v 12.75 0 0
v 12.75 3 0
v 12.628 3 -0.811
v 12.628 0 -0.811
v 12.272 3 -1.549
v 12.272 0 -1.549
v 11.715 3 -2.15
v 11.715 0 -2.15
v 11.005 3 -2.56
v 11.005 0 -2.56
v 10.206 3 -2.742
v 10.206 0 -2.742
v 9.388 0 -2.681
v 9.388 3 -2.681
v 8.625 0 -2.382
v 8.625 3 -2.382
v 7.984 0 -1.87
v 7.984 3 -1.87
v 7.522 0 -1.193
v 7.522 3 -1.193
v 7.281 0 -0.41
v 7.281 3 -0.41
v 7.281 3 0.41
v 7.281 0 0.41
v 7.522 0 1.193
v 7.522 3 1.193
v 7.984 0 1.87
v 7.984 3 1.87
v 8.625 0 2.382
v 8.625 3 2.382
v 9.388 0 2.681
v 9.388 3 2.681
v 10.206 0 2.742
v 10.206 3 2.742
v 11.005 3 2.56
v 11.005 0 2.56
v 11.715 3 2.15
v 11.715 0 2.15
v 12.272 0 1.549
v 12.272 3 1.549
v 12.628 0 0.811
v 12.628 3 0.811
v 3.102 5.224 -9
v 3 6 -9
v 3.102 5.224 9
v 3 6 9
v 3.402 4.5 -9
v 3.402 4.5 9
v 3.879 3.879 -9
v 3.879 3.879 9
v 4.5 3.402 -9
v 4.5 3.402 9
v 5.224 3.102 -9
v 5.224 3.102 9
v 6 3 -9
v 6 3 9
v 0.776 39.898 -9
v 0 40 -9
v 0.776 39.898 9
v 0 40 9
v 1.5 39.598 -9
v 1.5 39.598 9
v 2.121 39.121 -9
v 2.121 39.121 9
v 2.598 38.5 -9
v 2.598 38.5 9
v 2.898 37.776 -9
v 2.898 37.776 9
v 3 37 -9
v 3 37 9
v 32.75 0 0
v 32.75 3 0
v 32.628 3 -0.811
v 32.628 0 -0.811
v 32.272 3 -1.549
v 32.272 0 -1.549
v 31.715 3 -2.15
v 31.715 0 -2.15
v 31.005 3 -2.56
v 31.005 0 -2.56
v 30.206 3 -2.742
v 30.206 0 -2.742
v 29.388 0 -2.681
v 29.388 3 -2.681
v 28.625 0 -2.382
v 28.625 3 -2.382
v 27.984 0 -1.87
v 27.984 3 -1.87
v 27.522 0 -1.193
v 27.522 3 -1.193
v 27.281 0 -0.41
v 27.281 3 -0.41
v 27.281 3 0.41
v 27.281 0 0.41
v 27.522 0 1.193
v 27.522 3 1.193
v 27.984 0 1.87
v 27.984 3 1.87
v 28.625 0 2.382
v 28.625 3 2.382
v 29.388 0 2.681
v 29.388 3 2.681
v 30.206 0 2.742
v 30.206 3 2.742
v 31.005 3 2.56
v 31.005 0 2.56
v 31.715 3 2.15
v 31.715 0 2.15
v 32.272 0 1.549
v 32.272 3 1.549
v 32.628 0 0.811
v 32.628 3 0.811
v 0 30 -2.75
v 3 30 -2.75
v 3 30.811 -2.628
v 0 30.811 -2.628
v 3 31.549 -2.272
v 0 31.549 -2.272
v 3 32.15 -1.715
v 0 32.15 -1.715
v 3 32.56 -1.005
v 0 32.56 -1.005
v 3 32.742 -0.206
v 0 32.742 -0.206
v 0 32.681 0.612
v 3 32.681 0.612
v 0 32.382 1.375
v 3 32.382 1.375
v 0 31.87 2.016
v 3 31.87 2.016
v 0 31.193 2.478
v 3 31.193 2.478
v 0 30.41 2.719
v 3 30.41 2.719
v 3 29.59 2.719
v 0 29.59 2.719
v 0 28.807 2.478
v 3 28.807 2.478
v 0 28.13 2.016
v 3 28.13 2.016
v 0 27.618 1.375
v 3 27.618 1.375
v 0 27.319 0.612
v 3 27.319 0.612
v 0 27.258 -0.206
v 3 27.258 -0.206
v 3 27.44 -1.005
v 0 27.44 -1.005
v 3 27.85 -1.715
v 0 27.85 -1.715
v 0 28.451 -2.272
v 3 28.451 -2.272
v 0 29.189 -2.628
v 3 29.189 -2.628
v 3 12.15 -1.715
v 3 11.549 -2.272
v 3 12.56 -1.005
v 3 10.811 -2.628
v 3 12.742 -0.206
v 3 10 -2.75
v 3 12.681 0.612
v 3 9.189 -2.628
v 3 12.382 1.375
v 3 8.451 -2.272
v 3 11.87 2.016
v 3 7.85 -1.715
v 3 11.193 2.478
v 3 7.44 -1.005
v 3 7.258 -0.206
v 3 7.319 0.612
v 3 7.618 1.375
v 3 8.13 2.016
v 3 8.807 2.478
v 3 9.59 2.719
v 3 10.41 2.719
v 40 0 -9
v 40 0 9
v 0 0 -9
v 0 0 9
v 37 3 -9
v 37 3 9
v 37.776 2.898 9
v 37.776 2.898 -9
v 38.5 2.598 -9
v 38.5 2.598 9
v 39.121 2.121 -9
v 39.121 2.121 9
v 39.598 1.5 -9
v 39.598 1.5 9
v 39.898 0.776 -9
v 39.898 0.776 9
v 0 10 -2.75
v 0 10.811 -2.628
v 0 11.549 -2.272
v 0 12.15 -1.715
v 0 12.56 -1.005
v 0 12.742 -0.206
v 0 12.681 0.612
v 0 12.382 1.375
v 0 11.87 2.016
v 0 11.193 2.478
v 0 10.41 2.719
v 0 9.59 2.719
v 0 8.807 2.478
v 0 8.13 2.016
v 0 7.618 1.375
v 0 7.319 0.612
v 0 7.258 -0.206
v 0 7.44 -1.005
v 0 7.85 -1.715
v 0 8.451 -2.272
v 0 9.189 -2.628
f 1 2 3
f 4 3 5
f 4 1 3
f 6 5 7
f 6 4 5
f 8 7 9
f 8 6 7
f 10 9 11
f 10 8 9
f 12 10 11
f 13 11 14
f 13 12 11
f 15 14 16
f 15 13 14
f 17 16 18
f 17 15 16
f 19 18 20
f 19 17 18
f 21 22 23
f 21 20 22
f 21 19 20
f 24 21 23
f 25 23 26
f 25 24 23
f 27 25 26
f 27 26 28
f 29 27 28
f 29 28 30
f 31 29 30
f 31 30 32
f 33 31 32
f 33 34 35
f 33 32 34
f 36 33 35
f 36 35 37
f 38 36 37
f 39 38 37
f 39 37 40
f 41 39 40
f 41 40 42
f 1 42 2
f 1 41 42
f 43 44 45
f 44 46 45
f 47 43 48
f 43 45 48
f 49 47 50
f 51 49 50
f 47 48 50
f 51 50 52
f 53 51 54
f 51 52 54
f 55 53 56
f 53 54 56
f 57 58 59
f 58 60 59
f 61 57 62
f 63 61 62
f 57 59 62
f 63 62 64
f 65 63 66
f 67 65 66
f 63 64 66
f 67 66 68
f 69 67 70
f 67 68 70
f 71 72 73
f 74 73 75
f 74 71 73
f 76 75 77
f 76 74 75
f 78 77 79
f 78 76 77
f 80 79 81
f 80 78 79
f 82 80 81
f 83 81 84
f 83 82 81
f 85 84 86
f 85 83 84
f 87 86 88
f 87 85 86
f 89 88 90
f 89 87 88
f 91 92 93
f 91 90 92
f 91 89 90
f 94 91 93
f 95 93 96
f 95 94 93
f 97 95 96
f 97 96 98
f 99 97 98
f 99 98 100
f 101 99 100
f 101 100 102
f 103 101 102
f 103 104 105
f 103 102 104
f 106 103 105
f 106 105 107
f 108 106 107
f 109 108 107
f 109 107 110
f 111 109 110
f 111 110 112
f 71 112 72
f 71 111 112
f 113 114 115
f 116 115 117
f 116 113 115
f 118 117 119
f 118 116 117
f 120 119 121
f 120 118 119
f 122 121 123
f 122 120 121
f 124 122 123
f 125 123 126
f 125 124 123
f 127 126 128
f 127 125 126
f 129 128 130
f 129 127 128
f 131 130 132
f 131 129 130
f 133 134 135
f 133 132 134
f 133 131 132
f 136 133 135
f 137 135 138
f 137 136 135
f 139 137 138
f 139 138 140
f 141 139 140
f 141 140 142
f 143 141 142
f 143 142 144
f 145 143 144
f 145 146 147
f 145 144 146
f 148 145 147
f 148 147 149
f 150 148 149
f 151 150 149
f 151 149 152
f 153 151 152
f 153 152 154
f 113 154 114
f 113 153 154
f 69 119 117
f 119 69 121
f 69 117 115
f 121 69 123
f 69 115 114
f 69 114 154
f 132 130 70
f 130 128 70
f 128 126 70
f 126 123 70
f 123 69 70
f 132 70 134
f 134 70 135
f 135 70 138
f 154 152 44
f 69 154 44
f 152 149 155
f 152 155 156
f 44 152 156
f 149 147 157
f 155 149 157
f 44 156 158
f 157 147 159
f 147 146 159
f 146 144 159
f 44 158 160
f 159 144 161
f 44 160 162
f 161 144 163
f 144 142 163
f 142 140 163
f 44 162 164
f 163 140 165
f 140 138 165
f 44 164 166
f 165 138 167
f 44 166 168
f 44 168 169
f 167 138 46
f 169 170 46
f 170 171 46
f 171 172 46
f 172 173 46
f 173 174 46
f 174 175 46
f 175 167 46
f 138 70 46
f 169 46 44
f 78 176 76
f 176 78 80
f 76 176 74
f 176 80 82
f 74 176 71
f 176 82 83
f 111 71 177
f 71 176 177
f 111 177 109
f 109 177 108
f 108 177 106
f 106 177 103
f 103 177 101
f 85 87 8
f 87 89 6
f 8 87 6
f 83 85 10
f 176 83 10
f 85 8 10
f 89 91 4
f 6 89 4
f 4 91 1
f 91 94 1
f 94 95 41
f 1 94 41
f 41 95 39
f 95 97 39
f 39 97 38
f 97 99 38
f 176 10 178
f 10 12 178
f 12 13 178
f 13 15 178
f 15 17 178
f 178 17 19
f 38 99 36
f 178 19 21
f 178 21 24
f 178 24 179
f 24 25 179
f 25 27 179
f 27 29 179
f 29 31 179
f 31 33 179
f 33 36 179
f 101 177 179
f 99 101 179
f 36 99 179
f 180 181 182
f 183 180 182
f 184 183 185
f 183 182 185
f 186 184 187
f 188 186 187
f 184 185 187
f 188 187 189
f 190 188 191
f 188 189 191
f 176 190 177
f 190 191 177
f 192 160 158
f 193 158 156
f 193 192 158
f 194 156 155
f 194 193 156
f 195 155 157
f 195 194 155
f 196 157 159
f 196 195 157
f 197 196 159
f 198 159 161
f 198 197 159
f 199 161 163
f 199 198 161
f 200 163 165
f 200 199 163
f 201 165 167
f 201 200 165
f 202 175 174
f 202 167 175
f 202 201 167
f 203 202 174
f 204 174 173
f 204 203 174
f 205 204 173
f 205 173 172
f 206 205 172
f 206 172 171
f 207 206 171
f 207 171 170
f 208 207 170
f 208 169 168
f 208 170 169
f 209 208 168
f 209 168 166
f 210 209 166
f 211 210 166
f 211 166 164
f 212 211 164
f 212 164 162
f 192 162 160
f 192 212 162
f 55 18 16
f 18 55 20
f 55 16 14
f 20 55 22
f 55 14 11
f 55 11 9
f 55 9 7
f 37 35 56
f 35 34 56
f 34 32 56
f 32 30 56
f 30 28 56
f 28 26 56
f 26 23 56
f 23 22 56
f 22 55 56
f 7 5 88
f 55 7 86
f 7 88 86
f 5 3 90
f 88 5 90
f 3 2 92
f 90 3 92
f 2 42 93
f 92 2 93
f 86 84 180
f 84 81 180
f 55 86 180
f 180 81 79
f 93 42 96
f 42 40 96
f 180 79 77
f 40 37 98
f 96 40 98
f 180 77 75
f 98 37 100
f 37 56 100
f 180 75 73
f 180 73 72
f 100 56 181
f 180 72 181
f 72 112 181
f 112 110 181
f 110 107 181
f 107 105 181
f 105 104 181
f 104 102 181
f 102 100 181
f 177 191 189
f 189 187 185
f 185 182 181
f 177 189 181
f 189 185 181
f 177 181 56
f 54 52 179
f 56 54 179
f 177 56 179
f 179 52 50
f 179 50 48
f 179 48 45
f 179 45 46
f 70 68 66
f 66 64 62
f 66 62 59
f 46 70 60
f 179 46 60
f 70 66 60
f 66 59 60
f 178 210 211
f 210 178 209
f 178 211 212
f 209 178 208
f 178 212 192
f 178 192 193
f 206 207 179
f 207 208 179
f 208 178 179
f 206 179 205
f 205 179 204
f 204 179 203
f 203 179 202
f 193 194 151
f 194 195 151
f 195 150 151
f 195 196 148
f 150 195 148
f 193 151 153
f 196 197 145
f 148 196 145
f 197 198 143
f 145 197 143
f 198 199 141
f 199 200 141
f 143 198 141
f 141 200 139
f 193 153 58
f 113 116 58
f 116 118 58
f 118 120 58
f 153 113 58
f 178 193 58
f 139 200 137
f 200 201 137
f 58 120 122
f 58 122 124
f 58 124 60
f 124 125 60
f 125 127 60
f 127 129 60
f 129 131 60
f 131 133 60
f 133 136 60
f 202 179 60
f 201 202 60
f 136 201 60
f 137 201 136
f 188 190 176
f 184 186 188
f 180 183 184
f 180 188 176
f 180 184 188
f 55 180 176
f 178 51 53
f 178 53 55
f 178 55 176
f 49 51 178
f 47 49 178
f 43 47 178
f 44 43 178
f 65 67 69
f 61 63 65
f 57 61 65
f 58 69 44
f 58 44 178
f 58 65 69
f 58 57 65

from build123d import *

# Parameters (mm, degrees)
BOSS_EXTRUDE1_DEPTH = 9
SKETCH2_R           = 2.75
CUT_EXTRUDE1_DEPTH  = 41
SKETCH3_R           = 2.75
CUT_EXTRUDE2_DEPTH  = 41


with BuildPart() as part:
    # Sketch1 → Boss-Extrude1 (new body, symmetric)
    with BuildSketch(Plane.XY):
        with BuildLine():
            Line((0, 0), (0, 40))
            ThreePointArc((0, 40), (2.121320344, 39.121320344), (3, 37))
            Line((3, 37), (3, 6))
            ThreePointArc((3, 6), (3.878679656, 3.878679656), (6, 3))
            Line((6, 3), (37, 3))
            ThreePointArc((37, 3), (39.121320344, 2.121320344), (40, 0))
            Line((40, 0), (0, 0))
        make_face()
    extrude(amount=BOSS_EXTRUDE1_DEPTH, both=True)

    # Sketch2 → Cut-Extrude1 (cut, through all)
    with BuildSketch(Plane(origin=(0, 0, 0), x_dir=(1, 0, 0), z_dir=(0, 1, 0))):
        with Locations((10, 0)):
            Circle(SKETCH2_R)
        with Locations((30, 0)):
            Circle(SKETCH2_R)
    extrude(amount=CUT_EXTRUDE1_DEPTH, mode=Mode.SUBTRACT)

    # Sketch3 → Cut-Extrude2 (cut, through all)
    with BuildSketch(Plane(origin=(0, 0, 0), x_dir=(0, 0, -1), z_dir=(1, 0, 0))):
        with Locations((0, 10)):
            Circle(SKETCH3_R)
        with Locations((0, 30)):
            Circle(SKETCH3_R)
    extrude(amount=CUT_EXTRUDE2_DEPTH, mode=Mode.SUBTRACT)


solid = part.part
